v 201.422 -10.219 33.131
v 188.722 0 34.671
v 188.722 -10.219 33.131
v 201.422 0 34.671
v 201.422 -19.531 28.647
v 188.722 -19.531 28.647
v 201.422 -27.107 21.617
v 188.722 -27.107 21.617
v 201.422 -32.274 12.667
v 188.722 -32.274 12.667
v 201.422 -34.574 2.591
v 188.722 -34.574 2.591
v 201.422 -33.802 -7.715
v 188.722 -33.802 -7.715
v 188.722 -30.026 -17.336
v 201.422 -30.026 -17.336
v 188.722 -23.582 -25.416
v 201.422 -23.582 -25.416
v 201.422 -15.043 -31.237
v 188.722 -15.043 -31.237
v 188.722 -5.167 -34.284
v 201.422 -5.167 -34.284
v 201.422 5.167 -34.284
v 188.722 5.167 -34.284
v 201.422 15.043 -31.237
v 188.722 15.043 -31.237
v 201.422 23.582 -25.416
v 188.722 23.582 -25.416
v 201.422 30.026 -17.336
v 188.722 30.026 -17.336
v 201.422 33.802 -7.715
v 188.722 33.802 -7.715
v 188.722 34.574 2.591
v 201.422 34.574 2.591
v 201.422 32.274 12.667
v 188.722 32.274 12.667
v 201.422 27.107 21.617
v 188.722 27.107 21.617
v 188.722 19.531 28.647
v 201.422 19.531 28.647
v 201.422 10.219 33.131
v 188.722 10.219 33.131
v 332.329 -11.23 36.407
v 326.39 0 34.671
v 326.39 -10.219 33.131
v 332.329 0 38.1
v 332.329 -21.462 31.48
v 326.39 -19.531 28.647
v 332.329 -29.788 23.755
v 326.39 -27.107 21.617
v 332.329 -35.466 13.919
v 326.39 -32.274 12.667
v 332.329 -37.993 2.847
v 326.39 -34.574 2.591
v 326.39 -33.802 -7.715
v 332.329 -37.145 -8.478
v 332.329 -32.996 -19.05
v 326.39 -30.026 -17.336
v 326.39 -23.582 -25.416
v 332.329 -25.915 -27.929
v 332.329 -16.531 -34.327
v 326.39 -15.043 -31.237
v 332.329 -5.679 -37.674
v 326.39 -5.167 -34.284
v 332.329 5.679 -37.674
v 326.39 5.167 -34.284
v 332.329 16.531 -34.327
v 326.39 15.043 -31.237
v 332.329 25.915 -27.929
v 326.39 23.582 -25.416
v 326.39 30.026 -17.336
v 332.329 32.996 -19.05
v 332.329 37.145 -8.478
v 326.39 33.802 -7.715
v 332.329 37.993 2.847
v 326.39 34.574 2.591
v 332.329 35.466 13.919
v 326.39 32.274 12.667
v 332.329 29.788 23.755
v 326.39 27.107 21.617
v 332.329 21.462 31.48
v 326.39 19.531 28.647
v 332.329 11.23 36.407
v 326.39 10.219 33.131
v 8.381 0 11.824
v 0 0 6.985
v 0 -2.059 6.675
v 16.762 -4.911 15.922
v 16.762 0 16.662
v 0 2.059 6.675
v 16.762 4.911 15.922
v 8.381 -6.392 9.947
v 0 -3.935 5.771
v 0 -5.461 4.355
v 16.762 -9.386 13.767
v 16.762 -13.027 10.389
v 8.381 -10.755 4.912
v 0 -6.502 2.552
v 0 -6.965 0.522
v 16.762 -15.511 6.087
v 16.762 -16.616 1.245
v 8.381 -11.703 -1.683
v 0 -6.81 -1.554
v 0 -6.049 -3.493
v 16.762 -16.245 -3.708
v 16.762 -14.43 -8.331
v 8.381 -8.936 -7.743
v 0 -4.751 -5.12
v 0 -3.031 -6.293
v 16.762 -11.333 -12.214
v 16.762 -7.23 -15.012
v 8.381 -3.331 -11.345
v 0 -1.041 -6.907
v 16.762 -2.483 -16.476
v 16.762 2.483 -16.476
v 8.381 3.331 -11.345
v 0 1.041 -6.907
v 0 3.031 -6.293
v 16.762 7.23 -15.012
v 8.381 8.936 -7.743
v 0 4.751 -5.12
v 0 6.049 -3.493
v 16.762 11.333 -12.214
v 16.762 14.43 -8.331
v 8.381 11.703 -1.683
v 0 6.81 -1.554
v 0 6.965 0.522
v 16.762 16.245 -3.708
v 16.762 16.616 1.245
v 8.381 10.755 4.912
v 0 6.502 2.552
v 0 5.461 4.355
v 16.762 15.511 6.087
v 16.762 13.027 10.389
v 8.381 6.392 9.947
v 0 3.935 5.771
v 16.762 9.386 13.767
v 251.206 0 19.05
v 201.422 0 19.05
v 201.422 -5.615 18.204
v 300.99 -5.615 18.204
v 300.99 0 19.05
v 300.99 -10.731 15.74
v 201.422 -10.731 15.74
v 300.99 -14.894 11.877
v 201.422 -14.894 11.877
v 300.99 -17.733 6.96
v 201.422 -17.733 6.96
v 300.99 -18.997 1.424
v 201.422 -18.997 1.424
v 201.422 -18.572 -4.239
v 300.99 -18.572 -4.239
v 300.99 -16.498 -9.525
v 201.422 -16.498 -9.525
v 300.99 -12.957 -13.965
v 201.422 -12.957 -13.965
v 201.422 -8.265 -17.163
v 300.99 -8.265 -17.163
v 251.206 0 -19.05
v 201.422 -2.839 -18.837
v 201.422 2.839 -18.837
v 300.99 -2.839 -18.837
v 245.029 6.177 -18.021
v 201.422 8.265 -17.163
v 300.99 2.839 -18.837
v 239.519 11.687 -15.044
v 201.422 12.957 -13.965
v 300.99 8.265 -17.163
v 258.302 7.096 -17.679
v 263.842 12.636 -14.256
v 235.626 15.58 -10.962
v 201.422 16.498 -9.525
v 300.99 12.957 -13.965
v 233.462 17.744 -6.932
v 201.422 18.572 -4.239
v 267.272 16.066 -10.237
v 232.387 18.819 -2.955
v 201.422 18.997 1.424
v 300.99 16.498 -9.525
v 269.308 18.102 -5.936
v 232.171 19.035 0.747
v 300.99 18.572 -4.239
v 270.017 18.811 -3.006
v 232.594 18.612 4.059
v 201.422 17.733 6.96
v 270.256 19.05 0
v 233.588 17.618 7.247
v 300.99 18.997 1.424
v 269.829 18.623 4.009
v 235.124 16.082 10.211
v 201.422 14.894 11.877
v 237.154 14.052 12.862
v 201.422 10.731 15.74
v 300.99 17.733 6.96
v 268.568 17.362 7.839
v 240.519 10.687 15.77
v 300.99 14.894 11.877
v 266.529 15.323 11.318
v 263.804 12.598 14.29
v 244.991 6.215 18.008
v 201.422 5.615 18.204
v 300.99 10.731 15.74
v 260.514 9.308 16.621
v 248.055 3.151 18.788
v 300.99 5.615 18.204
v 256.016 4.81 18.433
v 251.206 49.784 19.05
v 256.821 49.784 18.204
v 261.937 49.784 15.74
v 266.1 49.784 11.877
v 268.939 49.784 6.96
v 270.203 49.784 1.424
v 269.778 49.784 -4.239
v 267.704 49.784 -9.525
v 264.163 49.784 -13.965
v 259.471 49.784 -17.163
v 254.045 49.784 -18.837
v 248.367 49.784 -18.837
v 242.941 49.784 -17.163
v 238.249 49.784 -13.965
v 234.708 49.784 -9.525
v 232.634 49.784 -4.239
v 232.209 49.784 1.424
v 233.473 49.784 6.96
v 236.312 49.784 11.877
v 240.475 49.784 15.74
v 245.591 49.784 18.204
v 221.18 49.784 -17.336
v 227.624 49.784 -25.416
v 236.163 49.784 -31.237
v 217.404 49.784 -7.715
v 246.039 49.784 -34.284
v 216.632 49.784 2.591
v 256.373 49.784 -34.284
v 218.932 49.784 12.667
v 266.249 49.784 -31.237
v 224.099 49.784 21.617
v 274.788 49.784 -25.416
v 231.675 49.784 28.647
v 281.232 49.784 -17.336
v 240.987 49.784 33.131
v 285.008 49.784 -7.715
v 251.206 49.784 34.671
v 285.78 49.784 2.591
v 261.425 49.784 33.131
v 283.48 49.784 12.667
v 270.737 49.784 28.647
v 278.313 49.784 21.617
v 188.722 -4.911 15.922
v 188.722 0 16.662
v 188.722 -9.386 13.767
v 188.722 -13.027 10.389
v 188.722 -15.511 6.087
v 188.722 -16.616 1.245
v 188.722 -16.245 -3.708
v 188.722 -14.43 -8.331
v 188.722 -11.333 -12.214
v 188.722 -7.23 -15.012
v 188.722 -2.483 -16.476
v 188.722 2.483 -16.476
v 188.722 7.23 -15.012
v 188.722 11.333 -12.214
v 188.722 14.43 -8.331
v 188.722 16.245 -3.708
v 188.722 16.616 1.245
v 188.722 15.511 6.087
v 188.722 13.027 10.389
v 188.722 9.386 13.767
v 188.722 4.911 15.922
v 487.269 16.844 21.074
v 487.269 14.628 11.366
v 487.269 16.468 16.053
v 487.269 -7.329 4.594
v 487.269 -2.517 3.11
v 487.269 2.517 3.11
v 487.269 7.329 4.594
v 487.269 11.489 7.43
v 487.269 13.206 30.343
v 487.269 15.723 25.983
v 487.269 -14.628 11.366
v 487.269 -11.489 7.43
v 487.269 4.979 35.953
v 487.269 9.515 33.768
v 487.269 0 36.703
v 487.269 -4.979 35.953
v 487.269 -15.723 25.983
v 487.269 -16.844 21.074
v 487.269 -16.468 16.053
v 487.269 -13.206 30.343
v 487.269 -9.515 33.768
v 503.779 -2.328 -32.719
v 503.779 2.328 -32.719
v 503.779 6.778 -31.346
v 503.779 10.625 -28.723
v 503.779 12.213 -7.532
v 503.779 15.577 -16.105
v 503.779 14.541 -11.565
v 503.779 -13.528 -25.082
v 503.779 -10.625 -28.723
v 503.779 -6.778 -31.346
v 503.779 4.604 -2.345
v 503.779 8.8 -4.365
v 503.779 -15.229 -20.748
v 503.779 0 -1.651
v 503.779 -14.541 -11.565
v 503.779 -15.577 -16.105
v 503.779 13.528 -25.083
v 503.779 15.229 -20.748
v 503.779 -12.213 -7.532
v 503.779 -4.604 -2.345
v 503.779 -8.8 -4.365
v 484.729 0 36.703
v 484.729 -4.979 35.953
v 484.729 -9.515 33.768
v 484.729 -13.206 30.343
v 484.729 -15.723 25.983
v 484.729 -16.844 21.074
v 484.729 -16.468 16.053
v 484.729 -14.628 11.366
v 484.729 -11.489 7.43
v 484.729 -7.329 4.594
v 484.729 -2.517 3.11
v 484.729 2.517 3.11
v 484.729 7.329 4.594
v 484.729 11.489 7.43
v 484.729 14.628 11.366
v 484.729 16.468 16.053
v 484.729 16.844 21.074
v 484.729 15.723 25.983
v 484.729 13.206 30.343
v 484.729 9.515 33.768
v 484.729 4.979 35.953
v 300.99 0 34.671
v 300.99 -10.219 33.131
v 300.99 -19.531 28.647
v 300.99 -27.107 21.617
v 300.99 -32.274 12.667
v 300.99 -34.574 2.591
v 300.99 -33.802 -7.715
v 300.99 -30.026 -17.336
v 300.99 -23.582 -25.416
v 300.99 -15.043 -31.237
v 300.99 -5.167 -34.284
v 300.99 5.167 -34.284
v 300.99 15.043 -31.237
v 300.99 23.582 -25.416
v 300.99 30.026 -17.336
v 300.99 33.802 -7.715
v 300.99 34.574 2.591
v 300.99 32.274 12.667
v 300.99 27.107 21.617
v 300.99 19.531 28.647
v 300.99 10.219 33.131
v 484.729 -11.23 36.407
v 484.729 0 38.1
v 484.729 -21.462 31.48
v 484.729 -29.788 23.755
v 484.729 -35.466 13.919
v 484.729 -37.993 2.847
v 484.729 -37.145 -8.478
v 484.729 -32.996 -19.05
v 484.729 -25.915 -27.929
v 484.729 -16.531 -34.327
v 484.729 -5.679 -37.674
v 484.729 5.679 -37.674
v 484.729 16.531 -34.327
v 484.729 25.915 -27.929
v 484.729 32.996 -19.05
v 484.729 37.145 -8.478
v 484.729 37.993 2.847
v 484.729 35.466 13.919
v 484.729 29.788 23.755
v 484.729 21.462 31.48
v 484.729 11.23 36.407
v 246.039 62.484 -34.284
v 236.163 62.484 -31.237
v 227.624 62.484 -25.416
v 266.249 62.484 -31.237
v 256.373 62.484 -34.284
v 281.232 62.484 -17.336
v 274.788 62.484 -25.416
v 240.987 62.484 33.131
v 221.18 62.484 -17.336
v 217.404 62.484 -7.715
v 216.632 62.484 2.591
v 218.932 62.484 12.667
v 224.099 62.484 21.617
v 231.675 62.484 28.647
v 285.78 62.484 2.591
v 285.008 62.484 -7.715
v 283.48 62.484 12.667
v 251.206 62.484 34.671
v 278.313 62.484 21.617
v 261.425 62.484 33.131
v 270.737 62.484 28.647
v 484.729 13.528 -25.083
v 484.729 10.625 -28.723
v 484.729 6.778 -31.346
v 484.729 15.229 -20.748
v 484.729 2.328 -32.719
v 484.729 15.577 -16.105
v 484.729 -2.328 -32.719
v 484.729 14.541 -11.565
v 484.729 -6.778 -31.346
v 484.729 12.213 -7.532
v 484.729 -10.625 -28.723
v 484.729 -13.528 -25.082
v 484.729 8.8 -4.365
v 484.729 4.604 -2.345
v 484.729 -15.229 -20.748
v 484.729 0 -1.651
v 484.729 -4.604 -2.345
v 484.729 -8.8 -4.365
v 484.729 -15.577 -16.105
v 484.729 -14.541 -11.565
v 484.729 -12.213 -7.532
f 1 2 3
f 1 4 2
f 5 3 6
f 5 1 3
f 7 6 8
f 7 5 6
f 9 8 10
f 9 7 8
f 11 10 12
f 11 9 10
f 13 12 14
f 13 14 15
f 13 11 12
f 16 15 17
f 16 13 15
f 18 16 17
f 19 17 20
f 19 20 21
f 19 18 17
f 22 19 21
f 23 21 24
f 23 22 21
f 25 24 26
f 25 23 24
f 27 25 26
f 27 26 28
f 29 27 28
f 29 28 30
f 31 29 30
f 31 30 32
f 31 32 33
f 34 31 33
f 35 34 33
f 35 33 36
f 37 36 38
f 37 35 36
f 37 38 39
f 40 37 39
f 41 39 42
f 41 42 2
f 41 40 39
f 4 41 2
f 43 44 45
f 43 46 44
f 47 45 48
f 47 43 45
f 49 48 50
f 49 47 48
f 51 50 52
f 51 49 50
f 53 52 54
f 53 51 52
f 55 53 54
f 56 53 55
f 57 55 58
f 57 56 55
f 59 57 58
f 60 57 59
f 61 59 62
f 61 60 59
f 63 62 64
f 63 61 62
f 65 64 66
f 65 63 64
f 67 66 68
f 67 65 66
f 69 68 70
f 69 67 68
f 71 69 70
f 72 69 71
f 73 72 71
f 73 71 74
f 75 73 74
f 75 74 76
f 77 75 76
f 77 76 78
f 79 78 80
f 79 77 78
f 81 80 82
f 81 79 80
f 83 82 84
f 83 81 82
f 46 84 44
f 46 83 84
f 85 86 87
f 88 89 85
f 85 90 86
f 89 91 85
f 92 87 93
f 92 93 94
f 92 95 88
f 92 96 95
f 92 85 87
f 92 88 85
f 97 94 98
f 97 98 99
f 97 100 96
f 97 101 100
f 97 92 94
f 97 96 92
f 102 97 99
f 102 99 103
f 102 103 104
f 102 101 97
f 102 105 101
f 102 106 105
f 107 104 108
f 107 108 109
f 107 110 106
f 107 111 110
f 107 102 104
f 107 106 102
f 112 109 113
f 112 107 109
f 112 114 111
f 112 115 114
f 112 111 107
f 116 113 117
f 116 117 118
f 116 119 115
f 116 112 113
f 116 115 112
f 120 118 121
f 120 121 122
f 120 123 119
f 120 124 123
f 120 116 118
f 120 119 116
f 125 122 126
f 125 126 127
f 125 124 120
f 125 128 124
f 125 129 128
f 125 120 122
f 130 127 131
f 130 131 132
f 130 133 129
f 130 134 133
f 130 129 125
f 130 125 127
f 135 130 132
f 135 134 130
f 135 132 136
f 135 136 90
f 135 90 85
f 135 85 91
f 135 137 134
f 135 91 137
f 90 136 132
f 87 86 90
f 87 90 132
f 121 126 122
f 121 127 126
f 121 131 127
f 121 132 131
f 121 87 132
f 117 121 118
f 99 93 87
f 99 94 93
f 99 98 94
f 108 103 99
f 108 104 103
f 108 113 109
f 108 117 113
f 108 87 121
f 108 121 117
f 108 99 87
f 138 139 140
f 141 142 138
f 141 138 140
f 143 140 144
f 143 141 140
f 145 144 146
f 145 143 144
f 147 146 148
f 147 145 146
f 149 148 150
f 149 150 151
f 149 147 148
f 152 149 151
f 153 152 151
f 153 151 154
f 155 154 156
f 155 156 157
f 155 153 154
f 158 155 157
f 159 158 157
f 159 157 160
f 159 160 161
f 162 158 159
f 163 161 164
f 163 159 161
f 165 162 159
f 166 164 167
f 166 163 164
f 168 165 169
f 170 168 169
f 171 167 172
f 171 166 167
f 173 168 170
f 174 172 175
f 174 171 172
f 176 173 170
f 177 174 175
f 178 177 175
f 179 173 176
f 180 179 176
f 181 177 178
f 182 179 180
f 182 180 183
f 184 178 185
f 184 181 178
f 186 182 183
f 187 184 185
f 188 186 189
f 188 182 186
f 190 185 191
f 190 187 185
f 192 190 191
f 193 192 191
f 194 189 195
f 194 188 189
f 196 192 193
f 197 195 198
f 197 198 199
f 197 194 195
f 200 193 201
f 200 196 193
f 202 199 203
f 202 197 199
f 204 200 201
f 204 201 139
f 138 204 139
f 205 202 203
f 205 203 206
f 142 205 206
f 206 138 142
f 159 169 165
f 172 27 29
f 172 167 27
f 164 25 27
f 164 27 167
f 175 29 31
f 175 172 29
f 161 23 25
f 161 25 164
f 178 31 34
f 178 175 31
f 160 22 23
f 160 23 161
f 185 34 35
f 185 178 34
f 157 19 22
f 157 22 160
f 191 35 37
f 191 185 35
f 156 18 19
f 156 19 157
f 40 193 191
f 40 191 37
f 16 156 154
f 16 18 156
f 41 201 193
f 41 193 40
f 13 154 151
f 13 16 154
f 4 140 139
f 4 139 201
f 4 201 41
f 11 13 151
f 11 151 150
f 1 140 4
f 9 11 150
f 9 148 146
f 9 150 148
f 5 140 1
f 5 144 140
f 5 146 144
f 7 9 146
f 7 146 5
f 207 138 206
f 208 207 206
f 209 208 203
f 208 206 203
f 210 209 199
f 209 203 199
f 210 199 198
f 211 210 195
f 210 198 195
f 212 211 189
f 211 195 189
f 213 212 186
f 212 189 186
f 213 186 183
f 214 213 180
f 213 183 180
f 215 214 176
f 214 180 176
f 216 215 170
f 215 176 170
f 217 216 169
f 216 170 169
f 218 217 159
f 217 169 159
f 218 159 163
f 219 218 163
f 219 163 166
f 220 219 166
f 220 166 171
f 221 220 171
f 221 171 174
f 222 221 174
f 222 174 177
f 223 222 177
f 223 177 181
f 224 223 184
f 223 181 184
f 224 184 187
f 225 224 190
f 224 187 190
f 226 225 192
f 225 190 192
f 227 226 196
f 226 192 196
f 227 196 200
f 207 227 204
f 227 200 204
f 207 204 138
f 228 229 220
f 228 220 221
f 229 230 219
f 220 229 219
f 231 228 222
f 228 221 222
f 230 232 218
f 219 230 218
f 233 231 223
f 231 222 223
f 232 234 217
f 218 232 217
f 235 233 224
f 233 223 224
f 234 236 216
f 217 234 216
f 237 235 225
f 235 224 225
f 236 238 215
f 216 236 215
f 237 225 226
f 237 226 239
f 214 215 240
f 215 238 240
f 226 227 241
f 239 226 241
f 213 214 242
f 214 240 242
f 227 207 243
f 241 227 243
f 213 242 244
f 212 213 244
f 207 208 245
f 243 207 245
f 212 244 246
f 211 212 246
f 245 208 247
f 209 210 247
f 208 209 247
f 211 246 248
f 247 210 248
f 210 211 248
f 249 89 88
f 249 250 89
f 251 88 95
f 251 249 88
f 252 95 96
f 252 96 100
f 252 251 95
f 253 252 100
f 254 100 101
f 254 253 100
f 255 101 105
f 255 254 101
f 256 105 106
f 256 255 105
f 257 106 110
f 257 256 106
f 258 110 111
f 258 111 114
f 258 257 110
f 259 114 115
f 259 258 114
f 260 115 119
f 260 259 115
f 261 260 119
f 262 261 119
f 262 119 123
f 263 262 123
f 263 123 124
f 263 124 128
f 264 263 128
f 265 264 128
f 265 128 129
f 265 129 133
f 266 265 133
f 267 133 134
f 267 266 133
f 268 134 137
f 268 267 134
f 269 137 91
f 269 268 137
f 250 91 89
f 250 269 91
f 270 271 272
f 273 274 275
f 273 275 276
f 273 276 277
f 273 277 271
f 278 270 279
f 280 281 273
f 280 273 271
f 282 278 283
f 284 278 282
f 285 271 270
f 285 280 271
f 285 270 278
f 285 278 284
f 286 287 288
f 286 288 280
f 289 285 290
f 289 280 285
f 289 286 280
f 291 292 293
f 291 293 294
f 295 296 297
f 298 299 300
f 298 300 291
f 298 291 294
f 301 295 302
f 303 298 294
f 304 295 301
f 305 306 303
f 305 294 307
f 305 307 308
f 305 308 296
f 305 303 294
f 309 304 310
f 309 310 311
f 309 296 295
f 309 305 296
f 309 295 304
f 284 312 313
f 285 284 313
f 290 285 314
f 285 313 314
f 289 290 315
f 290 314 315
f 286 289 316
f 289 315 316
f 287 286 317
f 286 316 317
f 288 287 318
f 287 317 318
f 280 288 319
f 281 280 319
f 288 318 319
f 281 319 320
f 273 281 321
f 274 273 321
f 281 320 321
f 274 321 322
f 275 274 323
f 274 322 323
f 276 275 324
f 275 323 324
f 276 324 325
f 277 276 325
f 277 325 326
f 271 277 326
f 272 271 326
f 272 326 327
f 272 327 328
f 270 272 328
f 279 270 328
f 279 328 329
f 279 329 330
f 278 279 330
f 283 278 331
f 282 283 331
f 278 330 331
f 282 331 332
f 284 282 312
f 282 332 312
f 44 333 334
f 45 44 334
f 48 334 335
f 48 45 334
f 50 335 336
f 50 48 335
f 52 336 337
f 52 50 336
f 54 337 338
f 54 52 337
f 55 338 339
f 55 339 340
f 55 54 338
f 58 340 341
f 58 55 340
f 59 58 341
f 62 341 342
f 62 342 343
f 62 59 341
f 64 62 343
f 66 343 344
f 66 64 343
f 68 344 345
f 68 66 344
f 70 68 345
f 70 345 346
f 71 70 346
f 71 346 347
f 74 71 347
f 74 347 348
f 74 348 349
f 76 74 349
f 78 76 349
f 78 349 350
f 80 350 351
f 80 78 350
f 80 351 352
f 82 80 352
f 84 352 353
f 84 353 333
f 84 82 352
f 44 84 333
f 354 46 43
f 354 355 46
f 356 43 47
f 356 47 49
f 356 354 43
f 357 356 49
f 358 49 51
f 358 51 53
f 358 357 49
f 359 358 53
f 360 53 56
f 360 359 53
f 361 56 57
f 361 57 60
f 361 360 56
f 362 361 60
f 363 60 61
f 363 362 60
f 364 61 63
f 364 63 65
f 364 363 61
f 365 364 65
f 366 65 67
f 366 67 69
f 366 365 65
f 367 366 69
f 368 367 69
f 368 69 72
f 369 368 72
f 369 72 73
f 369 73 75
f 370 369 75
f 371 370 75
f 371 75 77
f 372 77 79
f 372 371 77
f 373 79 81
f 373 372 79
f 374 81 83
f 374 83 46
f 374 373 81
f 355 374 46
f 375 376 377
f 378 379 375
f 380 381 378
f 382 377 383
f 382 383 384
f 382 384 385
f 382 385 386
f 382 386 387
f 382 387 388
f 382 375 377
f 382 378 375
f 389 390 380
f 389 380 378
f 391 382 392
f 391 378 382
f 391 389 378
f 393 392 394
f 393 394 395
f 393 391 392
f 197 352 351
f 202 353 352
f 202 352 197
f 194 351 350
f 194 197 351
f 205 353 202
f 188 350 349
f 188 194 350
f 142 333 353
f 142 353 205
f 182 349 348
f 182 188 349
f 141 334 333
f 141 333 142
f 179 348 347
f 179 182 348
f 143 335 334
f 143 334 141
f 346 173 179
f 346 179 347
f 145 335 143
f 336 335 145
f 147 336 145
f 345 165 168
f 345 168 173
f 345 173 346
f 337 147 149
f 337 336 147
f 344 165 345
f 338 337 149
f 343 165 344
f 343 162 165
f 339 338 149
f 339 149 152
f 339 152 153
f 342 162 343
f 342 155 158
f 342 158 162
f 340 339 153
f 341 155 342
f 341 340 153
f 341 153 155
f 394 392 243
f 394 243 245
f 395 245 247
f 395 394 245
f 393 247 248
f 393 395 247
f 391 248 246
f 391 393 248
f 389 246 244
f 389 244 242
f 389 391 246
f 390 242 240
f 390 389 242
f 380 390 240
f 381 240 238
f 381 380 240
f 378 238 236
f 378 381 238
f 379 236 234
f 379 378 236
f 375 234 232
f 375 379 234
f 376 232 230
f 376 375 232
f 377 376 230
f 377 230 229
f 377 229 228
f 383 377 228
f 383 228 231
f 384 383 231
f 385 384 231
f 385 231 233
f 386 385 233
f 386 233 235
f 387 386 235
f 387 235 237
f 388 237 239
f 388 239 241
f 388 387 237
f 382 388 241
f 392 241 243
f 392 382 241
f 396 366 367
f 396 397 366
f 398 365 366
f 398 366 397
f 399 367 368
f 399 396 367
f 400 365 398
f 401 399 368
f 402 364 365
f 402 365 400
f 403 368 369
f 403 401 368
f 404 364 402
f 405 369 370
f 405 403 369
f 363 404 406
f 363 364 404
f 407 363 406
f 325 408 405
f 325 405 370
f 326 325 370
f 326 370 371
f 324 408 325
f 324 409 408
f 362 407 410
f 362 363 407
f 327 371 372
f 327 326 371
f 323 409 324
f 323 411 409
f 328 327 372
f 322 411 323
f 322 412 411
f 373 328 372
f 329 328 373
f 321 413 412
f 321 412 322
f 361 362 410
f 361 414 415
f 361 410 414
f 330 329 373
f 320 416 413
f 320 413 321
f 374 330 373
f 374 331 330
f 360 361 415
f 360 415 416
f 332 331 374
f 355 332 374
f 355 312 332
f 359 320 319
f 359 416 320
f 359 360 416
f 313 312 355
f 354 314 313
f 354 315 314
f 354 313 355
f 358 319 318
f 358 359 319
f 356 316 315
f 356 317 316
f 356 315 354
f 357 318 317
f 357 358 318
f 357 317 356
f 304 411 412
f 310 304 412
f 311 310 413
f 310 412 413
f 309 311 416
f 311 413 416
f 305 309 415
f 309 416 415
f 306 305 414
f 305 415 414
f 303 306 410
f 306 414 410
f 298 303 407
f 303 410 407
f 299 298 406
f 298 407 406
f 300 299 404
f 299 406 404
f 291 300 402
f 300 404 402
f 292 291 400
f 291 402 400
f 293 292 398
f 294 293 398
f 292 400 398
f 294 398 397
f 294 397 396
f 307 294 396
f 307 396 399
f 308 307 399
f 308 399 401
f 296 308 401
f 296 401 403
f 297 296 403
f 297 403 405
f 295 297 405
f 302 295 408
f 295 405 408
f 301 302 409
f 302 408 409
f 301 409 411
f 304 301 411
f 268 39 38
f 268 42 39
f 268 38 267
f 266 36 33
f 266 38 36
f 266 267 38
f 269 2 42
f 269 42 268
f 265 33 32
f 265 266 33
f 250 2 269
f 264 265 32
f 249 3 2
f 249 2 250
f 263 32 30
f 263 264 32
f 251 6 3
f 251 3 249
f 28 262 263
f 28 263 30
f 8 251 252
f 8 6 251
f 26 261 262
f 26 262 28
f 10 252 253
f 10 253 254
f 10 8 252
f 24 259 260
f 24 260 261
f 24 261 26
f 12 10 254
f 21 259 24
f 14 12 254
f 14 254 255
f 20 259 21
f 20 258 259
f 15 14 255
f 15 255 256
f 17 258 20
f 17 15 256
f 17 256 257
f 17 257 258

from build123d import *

# Parameters (mm, degrees)
SKETCH2_R           = 19.05
BOSS_EXTRUDE1_DEPTH = 62.484
SKETCH3_R           = 34.671
BOSS_EXTRUDE2_DEPTH = 12.7
SKETCH4_R           = 15.621
BOSS_EXTRUDE3_DEPTH = 19.05
SKETCH5_R           = 16.891
BOSS_EXTRUDE4_DEPTH = 2.54


with BuildPart() as part:
    # Sketch1 → Revolve1 (revolve)
    with BuildSketch(Plane.XY, mode=Mode.PRIVATE) as revolve1_sk:
        Polygon((0, 0), (0, 6.985), (16.761748485, 16.6624), (188.722, 16.6624), (188.722, 34.671), (201.422, 34.671), (201.422, 19.05), (300.99, 19.05), (300.99, 34.671), (326.39, 34.671), (332.329202219, 38.1), (484.729202219, 38.1), (484.729202219, 0), align=None)
    revolve(revolve1_sk.sketch.rotate(Axis((0, 0, 0), (1, 0, 0)), 90), axis=Axis((0, 0, 0), (1, 0, 0)))  # turned: the seam where the file's is

    # Sketch2 → Boss-Extrude1 (add)
    with BuildSketch(Plane(origin=(0, 0, 0), x_dir=(1, 0, 0), z_dir=(0, 1, 0))):
        with Locations(Location((251.206, 0, 0), (0, 0, 270))):  # turned: the seam where the file's is
            Circle(SKETCH2_R)
    extrude(amount=BOSS_EXTRUDE1_DEPTH)

    # Sketch3 → Boss-Extrude2 (add)
    with BuildSketch(Plane(origin=(0, 62.484, 0), x_dir=(1, 0, 0), z_dir=(0, 1, 0))):
        with Locations(Location((251.206, 0, 0), (0, 0, 270))):  # turned: the seam where the file's is
            Circle(SKETCH3_R)
    extrude(amount=-BOSS_EXTRUDE2_DEPTH)

    # Sketch4 → Boss-Extrude3 (add)
    with BuildSketch(Plane(origin=(484.729202219, 0, 0), x_dir=(0, 0, -1), z_dir=(1, 0, 0))):
        with Locations(Location((17.272, 0, 0), (0, 0, 180))):  # turned: the seam where the file's is
            Circle(SKETCH4_R)
    extrude(amount=BOSS_EXTRUDE3_DEPTH)

    # Sketch5 → Boss-Extrude4 (add)
    with BuildSketch(Plane(origin=(484.729202219, 0, 0), x_dir=(0, 0, -1), z_dir=(1, 0, 0))):
        with Locations(Location((-19.812, 0, 0), (0, 0, 180))):  # turned: the seam where the file's is
            Circle(SKETCH5_R)
    extrude(amount=BOSS_EXTRUDE4_DEPTH)


solid = part.part
